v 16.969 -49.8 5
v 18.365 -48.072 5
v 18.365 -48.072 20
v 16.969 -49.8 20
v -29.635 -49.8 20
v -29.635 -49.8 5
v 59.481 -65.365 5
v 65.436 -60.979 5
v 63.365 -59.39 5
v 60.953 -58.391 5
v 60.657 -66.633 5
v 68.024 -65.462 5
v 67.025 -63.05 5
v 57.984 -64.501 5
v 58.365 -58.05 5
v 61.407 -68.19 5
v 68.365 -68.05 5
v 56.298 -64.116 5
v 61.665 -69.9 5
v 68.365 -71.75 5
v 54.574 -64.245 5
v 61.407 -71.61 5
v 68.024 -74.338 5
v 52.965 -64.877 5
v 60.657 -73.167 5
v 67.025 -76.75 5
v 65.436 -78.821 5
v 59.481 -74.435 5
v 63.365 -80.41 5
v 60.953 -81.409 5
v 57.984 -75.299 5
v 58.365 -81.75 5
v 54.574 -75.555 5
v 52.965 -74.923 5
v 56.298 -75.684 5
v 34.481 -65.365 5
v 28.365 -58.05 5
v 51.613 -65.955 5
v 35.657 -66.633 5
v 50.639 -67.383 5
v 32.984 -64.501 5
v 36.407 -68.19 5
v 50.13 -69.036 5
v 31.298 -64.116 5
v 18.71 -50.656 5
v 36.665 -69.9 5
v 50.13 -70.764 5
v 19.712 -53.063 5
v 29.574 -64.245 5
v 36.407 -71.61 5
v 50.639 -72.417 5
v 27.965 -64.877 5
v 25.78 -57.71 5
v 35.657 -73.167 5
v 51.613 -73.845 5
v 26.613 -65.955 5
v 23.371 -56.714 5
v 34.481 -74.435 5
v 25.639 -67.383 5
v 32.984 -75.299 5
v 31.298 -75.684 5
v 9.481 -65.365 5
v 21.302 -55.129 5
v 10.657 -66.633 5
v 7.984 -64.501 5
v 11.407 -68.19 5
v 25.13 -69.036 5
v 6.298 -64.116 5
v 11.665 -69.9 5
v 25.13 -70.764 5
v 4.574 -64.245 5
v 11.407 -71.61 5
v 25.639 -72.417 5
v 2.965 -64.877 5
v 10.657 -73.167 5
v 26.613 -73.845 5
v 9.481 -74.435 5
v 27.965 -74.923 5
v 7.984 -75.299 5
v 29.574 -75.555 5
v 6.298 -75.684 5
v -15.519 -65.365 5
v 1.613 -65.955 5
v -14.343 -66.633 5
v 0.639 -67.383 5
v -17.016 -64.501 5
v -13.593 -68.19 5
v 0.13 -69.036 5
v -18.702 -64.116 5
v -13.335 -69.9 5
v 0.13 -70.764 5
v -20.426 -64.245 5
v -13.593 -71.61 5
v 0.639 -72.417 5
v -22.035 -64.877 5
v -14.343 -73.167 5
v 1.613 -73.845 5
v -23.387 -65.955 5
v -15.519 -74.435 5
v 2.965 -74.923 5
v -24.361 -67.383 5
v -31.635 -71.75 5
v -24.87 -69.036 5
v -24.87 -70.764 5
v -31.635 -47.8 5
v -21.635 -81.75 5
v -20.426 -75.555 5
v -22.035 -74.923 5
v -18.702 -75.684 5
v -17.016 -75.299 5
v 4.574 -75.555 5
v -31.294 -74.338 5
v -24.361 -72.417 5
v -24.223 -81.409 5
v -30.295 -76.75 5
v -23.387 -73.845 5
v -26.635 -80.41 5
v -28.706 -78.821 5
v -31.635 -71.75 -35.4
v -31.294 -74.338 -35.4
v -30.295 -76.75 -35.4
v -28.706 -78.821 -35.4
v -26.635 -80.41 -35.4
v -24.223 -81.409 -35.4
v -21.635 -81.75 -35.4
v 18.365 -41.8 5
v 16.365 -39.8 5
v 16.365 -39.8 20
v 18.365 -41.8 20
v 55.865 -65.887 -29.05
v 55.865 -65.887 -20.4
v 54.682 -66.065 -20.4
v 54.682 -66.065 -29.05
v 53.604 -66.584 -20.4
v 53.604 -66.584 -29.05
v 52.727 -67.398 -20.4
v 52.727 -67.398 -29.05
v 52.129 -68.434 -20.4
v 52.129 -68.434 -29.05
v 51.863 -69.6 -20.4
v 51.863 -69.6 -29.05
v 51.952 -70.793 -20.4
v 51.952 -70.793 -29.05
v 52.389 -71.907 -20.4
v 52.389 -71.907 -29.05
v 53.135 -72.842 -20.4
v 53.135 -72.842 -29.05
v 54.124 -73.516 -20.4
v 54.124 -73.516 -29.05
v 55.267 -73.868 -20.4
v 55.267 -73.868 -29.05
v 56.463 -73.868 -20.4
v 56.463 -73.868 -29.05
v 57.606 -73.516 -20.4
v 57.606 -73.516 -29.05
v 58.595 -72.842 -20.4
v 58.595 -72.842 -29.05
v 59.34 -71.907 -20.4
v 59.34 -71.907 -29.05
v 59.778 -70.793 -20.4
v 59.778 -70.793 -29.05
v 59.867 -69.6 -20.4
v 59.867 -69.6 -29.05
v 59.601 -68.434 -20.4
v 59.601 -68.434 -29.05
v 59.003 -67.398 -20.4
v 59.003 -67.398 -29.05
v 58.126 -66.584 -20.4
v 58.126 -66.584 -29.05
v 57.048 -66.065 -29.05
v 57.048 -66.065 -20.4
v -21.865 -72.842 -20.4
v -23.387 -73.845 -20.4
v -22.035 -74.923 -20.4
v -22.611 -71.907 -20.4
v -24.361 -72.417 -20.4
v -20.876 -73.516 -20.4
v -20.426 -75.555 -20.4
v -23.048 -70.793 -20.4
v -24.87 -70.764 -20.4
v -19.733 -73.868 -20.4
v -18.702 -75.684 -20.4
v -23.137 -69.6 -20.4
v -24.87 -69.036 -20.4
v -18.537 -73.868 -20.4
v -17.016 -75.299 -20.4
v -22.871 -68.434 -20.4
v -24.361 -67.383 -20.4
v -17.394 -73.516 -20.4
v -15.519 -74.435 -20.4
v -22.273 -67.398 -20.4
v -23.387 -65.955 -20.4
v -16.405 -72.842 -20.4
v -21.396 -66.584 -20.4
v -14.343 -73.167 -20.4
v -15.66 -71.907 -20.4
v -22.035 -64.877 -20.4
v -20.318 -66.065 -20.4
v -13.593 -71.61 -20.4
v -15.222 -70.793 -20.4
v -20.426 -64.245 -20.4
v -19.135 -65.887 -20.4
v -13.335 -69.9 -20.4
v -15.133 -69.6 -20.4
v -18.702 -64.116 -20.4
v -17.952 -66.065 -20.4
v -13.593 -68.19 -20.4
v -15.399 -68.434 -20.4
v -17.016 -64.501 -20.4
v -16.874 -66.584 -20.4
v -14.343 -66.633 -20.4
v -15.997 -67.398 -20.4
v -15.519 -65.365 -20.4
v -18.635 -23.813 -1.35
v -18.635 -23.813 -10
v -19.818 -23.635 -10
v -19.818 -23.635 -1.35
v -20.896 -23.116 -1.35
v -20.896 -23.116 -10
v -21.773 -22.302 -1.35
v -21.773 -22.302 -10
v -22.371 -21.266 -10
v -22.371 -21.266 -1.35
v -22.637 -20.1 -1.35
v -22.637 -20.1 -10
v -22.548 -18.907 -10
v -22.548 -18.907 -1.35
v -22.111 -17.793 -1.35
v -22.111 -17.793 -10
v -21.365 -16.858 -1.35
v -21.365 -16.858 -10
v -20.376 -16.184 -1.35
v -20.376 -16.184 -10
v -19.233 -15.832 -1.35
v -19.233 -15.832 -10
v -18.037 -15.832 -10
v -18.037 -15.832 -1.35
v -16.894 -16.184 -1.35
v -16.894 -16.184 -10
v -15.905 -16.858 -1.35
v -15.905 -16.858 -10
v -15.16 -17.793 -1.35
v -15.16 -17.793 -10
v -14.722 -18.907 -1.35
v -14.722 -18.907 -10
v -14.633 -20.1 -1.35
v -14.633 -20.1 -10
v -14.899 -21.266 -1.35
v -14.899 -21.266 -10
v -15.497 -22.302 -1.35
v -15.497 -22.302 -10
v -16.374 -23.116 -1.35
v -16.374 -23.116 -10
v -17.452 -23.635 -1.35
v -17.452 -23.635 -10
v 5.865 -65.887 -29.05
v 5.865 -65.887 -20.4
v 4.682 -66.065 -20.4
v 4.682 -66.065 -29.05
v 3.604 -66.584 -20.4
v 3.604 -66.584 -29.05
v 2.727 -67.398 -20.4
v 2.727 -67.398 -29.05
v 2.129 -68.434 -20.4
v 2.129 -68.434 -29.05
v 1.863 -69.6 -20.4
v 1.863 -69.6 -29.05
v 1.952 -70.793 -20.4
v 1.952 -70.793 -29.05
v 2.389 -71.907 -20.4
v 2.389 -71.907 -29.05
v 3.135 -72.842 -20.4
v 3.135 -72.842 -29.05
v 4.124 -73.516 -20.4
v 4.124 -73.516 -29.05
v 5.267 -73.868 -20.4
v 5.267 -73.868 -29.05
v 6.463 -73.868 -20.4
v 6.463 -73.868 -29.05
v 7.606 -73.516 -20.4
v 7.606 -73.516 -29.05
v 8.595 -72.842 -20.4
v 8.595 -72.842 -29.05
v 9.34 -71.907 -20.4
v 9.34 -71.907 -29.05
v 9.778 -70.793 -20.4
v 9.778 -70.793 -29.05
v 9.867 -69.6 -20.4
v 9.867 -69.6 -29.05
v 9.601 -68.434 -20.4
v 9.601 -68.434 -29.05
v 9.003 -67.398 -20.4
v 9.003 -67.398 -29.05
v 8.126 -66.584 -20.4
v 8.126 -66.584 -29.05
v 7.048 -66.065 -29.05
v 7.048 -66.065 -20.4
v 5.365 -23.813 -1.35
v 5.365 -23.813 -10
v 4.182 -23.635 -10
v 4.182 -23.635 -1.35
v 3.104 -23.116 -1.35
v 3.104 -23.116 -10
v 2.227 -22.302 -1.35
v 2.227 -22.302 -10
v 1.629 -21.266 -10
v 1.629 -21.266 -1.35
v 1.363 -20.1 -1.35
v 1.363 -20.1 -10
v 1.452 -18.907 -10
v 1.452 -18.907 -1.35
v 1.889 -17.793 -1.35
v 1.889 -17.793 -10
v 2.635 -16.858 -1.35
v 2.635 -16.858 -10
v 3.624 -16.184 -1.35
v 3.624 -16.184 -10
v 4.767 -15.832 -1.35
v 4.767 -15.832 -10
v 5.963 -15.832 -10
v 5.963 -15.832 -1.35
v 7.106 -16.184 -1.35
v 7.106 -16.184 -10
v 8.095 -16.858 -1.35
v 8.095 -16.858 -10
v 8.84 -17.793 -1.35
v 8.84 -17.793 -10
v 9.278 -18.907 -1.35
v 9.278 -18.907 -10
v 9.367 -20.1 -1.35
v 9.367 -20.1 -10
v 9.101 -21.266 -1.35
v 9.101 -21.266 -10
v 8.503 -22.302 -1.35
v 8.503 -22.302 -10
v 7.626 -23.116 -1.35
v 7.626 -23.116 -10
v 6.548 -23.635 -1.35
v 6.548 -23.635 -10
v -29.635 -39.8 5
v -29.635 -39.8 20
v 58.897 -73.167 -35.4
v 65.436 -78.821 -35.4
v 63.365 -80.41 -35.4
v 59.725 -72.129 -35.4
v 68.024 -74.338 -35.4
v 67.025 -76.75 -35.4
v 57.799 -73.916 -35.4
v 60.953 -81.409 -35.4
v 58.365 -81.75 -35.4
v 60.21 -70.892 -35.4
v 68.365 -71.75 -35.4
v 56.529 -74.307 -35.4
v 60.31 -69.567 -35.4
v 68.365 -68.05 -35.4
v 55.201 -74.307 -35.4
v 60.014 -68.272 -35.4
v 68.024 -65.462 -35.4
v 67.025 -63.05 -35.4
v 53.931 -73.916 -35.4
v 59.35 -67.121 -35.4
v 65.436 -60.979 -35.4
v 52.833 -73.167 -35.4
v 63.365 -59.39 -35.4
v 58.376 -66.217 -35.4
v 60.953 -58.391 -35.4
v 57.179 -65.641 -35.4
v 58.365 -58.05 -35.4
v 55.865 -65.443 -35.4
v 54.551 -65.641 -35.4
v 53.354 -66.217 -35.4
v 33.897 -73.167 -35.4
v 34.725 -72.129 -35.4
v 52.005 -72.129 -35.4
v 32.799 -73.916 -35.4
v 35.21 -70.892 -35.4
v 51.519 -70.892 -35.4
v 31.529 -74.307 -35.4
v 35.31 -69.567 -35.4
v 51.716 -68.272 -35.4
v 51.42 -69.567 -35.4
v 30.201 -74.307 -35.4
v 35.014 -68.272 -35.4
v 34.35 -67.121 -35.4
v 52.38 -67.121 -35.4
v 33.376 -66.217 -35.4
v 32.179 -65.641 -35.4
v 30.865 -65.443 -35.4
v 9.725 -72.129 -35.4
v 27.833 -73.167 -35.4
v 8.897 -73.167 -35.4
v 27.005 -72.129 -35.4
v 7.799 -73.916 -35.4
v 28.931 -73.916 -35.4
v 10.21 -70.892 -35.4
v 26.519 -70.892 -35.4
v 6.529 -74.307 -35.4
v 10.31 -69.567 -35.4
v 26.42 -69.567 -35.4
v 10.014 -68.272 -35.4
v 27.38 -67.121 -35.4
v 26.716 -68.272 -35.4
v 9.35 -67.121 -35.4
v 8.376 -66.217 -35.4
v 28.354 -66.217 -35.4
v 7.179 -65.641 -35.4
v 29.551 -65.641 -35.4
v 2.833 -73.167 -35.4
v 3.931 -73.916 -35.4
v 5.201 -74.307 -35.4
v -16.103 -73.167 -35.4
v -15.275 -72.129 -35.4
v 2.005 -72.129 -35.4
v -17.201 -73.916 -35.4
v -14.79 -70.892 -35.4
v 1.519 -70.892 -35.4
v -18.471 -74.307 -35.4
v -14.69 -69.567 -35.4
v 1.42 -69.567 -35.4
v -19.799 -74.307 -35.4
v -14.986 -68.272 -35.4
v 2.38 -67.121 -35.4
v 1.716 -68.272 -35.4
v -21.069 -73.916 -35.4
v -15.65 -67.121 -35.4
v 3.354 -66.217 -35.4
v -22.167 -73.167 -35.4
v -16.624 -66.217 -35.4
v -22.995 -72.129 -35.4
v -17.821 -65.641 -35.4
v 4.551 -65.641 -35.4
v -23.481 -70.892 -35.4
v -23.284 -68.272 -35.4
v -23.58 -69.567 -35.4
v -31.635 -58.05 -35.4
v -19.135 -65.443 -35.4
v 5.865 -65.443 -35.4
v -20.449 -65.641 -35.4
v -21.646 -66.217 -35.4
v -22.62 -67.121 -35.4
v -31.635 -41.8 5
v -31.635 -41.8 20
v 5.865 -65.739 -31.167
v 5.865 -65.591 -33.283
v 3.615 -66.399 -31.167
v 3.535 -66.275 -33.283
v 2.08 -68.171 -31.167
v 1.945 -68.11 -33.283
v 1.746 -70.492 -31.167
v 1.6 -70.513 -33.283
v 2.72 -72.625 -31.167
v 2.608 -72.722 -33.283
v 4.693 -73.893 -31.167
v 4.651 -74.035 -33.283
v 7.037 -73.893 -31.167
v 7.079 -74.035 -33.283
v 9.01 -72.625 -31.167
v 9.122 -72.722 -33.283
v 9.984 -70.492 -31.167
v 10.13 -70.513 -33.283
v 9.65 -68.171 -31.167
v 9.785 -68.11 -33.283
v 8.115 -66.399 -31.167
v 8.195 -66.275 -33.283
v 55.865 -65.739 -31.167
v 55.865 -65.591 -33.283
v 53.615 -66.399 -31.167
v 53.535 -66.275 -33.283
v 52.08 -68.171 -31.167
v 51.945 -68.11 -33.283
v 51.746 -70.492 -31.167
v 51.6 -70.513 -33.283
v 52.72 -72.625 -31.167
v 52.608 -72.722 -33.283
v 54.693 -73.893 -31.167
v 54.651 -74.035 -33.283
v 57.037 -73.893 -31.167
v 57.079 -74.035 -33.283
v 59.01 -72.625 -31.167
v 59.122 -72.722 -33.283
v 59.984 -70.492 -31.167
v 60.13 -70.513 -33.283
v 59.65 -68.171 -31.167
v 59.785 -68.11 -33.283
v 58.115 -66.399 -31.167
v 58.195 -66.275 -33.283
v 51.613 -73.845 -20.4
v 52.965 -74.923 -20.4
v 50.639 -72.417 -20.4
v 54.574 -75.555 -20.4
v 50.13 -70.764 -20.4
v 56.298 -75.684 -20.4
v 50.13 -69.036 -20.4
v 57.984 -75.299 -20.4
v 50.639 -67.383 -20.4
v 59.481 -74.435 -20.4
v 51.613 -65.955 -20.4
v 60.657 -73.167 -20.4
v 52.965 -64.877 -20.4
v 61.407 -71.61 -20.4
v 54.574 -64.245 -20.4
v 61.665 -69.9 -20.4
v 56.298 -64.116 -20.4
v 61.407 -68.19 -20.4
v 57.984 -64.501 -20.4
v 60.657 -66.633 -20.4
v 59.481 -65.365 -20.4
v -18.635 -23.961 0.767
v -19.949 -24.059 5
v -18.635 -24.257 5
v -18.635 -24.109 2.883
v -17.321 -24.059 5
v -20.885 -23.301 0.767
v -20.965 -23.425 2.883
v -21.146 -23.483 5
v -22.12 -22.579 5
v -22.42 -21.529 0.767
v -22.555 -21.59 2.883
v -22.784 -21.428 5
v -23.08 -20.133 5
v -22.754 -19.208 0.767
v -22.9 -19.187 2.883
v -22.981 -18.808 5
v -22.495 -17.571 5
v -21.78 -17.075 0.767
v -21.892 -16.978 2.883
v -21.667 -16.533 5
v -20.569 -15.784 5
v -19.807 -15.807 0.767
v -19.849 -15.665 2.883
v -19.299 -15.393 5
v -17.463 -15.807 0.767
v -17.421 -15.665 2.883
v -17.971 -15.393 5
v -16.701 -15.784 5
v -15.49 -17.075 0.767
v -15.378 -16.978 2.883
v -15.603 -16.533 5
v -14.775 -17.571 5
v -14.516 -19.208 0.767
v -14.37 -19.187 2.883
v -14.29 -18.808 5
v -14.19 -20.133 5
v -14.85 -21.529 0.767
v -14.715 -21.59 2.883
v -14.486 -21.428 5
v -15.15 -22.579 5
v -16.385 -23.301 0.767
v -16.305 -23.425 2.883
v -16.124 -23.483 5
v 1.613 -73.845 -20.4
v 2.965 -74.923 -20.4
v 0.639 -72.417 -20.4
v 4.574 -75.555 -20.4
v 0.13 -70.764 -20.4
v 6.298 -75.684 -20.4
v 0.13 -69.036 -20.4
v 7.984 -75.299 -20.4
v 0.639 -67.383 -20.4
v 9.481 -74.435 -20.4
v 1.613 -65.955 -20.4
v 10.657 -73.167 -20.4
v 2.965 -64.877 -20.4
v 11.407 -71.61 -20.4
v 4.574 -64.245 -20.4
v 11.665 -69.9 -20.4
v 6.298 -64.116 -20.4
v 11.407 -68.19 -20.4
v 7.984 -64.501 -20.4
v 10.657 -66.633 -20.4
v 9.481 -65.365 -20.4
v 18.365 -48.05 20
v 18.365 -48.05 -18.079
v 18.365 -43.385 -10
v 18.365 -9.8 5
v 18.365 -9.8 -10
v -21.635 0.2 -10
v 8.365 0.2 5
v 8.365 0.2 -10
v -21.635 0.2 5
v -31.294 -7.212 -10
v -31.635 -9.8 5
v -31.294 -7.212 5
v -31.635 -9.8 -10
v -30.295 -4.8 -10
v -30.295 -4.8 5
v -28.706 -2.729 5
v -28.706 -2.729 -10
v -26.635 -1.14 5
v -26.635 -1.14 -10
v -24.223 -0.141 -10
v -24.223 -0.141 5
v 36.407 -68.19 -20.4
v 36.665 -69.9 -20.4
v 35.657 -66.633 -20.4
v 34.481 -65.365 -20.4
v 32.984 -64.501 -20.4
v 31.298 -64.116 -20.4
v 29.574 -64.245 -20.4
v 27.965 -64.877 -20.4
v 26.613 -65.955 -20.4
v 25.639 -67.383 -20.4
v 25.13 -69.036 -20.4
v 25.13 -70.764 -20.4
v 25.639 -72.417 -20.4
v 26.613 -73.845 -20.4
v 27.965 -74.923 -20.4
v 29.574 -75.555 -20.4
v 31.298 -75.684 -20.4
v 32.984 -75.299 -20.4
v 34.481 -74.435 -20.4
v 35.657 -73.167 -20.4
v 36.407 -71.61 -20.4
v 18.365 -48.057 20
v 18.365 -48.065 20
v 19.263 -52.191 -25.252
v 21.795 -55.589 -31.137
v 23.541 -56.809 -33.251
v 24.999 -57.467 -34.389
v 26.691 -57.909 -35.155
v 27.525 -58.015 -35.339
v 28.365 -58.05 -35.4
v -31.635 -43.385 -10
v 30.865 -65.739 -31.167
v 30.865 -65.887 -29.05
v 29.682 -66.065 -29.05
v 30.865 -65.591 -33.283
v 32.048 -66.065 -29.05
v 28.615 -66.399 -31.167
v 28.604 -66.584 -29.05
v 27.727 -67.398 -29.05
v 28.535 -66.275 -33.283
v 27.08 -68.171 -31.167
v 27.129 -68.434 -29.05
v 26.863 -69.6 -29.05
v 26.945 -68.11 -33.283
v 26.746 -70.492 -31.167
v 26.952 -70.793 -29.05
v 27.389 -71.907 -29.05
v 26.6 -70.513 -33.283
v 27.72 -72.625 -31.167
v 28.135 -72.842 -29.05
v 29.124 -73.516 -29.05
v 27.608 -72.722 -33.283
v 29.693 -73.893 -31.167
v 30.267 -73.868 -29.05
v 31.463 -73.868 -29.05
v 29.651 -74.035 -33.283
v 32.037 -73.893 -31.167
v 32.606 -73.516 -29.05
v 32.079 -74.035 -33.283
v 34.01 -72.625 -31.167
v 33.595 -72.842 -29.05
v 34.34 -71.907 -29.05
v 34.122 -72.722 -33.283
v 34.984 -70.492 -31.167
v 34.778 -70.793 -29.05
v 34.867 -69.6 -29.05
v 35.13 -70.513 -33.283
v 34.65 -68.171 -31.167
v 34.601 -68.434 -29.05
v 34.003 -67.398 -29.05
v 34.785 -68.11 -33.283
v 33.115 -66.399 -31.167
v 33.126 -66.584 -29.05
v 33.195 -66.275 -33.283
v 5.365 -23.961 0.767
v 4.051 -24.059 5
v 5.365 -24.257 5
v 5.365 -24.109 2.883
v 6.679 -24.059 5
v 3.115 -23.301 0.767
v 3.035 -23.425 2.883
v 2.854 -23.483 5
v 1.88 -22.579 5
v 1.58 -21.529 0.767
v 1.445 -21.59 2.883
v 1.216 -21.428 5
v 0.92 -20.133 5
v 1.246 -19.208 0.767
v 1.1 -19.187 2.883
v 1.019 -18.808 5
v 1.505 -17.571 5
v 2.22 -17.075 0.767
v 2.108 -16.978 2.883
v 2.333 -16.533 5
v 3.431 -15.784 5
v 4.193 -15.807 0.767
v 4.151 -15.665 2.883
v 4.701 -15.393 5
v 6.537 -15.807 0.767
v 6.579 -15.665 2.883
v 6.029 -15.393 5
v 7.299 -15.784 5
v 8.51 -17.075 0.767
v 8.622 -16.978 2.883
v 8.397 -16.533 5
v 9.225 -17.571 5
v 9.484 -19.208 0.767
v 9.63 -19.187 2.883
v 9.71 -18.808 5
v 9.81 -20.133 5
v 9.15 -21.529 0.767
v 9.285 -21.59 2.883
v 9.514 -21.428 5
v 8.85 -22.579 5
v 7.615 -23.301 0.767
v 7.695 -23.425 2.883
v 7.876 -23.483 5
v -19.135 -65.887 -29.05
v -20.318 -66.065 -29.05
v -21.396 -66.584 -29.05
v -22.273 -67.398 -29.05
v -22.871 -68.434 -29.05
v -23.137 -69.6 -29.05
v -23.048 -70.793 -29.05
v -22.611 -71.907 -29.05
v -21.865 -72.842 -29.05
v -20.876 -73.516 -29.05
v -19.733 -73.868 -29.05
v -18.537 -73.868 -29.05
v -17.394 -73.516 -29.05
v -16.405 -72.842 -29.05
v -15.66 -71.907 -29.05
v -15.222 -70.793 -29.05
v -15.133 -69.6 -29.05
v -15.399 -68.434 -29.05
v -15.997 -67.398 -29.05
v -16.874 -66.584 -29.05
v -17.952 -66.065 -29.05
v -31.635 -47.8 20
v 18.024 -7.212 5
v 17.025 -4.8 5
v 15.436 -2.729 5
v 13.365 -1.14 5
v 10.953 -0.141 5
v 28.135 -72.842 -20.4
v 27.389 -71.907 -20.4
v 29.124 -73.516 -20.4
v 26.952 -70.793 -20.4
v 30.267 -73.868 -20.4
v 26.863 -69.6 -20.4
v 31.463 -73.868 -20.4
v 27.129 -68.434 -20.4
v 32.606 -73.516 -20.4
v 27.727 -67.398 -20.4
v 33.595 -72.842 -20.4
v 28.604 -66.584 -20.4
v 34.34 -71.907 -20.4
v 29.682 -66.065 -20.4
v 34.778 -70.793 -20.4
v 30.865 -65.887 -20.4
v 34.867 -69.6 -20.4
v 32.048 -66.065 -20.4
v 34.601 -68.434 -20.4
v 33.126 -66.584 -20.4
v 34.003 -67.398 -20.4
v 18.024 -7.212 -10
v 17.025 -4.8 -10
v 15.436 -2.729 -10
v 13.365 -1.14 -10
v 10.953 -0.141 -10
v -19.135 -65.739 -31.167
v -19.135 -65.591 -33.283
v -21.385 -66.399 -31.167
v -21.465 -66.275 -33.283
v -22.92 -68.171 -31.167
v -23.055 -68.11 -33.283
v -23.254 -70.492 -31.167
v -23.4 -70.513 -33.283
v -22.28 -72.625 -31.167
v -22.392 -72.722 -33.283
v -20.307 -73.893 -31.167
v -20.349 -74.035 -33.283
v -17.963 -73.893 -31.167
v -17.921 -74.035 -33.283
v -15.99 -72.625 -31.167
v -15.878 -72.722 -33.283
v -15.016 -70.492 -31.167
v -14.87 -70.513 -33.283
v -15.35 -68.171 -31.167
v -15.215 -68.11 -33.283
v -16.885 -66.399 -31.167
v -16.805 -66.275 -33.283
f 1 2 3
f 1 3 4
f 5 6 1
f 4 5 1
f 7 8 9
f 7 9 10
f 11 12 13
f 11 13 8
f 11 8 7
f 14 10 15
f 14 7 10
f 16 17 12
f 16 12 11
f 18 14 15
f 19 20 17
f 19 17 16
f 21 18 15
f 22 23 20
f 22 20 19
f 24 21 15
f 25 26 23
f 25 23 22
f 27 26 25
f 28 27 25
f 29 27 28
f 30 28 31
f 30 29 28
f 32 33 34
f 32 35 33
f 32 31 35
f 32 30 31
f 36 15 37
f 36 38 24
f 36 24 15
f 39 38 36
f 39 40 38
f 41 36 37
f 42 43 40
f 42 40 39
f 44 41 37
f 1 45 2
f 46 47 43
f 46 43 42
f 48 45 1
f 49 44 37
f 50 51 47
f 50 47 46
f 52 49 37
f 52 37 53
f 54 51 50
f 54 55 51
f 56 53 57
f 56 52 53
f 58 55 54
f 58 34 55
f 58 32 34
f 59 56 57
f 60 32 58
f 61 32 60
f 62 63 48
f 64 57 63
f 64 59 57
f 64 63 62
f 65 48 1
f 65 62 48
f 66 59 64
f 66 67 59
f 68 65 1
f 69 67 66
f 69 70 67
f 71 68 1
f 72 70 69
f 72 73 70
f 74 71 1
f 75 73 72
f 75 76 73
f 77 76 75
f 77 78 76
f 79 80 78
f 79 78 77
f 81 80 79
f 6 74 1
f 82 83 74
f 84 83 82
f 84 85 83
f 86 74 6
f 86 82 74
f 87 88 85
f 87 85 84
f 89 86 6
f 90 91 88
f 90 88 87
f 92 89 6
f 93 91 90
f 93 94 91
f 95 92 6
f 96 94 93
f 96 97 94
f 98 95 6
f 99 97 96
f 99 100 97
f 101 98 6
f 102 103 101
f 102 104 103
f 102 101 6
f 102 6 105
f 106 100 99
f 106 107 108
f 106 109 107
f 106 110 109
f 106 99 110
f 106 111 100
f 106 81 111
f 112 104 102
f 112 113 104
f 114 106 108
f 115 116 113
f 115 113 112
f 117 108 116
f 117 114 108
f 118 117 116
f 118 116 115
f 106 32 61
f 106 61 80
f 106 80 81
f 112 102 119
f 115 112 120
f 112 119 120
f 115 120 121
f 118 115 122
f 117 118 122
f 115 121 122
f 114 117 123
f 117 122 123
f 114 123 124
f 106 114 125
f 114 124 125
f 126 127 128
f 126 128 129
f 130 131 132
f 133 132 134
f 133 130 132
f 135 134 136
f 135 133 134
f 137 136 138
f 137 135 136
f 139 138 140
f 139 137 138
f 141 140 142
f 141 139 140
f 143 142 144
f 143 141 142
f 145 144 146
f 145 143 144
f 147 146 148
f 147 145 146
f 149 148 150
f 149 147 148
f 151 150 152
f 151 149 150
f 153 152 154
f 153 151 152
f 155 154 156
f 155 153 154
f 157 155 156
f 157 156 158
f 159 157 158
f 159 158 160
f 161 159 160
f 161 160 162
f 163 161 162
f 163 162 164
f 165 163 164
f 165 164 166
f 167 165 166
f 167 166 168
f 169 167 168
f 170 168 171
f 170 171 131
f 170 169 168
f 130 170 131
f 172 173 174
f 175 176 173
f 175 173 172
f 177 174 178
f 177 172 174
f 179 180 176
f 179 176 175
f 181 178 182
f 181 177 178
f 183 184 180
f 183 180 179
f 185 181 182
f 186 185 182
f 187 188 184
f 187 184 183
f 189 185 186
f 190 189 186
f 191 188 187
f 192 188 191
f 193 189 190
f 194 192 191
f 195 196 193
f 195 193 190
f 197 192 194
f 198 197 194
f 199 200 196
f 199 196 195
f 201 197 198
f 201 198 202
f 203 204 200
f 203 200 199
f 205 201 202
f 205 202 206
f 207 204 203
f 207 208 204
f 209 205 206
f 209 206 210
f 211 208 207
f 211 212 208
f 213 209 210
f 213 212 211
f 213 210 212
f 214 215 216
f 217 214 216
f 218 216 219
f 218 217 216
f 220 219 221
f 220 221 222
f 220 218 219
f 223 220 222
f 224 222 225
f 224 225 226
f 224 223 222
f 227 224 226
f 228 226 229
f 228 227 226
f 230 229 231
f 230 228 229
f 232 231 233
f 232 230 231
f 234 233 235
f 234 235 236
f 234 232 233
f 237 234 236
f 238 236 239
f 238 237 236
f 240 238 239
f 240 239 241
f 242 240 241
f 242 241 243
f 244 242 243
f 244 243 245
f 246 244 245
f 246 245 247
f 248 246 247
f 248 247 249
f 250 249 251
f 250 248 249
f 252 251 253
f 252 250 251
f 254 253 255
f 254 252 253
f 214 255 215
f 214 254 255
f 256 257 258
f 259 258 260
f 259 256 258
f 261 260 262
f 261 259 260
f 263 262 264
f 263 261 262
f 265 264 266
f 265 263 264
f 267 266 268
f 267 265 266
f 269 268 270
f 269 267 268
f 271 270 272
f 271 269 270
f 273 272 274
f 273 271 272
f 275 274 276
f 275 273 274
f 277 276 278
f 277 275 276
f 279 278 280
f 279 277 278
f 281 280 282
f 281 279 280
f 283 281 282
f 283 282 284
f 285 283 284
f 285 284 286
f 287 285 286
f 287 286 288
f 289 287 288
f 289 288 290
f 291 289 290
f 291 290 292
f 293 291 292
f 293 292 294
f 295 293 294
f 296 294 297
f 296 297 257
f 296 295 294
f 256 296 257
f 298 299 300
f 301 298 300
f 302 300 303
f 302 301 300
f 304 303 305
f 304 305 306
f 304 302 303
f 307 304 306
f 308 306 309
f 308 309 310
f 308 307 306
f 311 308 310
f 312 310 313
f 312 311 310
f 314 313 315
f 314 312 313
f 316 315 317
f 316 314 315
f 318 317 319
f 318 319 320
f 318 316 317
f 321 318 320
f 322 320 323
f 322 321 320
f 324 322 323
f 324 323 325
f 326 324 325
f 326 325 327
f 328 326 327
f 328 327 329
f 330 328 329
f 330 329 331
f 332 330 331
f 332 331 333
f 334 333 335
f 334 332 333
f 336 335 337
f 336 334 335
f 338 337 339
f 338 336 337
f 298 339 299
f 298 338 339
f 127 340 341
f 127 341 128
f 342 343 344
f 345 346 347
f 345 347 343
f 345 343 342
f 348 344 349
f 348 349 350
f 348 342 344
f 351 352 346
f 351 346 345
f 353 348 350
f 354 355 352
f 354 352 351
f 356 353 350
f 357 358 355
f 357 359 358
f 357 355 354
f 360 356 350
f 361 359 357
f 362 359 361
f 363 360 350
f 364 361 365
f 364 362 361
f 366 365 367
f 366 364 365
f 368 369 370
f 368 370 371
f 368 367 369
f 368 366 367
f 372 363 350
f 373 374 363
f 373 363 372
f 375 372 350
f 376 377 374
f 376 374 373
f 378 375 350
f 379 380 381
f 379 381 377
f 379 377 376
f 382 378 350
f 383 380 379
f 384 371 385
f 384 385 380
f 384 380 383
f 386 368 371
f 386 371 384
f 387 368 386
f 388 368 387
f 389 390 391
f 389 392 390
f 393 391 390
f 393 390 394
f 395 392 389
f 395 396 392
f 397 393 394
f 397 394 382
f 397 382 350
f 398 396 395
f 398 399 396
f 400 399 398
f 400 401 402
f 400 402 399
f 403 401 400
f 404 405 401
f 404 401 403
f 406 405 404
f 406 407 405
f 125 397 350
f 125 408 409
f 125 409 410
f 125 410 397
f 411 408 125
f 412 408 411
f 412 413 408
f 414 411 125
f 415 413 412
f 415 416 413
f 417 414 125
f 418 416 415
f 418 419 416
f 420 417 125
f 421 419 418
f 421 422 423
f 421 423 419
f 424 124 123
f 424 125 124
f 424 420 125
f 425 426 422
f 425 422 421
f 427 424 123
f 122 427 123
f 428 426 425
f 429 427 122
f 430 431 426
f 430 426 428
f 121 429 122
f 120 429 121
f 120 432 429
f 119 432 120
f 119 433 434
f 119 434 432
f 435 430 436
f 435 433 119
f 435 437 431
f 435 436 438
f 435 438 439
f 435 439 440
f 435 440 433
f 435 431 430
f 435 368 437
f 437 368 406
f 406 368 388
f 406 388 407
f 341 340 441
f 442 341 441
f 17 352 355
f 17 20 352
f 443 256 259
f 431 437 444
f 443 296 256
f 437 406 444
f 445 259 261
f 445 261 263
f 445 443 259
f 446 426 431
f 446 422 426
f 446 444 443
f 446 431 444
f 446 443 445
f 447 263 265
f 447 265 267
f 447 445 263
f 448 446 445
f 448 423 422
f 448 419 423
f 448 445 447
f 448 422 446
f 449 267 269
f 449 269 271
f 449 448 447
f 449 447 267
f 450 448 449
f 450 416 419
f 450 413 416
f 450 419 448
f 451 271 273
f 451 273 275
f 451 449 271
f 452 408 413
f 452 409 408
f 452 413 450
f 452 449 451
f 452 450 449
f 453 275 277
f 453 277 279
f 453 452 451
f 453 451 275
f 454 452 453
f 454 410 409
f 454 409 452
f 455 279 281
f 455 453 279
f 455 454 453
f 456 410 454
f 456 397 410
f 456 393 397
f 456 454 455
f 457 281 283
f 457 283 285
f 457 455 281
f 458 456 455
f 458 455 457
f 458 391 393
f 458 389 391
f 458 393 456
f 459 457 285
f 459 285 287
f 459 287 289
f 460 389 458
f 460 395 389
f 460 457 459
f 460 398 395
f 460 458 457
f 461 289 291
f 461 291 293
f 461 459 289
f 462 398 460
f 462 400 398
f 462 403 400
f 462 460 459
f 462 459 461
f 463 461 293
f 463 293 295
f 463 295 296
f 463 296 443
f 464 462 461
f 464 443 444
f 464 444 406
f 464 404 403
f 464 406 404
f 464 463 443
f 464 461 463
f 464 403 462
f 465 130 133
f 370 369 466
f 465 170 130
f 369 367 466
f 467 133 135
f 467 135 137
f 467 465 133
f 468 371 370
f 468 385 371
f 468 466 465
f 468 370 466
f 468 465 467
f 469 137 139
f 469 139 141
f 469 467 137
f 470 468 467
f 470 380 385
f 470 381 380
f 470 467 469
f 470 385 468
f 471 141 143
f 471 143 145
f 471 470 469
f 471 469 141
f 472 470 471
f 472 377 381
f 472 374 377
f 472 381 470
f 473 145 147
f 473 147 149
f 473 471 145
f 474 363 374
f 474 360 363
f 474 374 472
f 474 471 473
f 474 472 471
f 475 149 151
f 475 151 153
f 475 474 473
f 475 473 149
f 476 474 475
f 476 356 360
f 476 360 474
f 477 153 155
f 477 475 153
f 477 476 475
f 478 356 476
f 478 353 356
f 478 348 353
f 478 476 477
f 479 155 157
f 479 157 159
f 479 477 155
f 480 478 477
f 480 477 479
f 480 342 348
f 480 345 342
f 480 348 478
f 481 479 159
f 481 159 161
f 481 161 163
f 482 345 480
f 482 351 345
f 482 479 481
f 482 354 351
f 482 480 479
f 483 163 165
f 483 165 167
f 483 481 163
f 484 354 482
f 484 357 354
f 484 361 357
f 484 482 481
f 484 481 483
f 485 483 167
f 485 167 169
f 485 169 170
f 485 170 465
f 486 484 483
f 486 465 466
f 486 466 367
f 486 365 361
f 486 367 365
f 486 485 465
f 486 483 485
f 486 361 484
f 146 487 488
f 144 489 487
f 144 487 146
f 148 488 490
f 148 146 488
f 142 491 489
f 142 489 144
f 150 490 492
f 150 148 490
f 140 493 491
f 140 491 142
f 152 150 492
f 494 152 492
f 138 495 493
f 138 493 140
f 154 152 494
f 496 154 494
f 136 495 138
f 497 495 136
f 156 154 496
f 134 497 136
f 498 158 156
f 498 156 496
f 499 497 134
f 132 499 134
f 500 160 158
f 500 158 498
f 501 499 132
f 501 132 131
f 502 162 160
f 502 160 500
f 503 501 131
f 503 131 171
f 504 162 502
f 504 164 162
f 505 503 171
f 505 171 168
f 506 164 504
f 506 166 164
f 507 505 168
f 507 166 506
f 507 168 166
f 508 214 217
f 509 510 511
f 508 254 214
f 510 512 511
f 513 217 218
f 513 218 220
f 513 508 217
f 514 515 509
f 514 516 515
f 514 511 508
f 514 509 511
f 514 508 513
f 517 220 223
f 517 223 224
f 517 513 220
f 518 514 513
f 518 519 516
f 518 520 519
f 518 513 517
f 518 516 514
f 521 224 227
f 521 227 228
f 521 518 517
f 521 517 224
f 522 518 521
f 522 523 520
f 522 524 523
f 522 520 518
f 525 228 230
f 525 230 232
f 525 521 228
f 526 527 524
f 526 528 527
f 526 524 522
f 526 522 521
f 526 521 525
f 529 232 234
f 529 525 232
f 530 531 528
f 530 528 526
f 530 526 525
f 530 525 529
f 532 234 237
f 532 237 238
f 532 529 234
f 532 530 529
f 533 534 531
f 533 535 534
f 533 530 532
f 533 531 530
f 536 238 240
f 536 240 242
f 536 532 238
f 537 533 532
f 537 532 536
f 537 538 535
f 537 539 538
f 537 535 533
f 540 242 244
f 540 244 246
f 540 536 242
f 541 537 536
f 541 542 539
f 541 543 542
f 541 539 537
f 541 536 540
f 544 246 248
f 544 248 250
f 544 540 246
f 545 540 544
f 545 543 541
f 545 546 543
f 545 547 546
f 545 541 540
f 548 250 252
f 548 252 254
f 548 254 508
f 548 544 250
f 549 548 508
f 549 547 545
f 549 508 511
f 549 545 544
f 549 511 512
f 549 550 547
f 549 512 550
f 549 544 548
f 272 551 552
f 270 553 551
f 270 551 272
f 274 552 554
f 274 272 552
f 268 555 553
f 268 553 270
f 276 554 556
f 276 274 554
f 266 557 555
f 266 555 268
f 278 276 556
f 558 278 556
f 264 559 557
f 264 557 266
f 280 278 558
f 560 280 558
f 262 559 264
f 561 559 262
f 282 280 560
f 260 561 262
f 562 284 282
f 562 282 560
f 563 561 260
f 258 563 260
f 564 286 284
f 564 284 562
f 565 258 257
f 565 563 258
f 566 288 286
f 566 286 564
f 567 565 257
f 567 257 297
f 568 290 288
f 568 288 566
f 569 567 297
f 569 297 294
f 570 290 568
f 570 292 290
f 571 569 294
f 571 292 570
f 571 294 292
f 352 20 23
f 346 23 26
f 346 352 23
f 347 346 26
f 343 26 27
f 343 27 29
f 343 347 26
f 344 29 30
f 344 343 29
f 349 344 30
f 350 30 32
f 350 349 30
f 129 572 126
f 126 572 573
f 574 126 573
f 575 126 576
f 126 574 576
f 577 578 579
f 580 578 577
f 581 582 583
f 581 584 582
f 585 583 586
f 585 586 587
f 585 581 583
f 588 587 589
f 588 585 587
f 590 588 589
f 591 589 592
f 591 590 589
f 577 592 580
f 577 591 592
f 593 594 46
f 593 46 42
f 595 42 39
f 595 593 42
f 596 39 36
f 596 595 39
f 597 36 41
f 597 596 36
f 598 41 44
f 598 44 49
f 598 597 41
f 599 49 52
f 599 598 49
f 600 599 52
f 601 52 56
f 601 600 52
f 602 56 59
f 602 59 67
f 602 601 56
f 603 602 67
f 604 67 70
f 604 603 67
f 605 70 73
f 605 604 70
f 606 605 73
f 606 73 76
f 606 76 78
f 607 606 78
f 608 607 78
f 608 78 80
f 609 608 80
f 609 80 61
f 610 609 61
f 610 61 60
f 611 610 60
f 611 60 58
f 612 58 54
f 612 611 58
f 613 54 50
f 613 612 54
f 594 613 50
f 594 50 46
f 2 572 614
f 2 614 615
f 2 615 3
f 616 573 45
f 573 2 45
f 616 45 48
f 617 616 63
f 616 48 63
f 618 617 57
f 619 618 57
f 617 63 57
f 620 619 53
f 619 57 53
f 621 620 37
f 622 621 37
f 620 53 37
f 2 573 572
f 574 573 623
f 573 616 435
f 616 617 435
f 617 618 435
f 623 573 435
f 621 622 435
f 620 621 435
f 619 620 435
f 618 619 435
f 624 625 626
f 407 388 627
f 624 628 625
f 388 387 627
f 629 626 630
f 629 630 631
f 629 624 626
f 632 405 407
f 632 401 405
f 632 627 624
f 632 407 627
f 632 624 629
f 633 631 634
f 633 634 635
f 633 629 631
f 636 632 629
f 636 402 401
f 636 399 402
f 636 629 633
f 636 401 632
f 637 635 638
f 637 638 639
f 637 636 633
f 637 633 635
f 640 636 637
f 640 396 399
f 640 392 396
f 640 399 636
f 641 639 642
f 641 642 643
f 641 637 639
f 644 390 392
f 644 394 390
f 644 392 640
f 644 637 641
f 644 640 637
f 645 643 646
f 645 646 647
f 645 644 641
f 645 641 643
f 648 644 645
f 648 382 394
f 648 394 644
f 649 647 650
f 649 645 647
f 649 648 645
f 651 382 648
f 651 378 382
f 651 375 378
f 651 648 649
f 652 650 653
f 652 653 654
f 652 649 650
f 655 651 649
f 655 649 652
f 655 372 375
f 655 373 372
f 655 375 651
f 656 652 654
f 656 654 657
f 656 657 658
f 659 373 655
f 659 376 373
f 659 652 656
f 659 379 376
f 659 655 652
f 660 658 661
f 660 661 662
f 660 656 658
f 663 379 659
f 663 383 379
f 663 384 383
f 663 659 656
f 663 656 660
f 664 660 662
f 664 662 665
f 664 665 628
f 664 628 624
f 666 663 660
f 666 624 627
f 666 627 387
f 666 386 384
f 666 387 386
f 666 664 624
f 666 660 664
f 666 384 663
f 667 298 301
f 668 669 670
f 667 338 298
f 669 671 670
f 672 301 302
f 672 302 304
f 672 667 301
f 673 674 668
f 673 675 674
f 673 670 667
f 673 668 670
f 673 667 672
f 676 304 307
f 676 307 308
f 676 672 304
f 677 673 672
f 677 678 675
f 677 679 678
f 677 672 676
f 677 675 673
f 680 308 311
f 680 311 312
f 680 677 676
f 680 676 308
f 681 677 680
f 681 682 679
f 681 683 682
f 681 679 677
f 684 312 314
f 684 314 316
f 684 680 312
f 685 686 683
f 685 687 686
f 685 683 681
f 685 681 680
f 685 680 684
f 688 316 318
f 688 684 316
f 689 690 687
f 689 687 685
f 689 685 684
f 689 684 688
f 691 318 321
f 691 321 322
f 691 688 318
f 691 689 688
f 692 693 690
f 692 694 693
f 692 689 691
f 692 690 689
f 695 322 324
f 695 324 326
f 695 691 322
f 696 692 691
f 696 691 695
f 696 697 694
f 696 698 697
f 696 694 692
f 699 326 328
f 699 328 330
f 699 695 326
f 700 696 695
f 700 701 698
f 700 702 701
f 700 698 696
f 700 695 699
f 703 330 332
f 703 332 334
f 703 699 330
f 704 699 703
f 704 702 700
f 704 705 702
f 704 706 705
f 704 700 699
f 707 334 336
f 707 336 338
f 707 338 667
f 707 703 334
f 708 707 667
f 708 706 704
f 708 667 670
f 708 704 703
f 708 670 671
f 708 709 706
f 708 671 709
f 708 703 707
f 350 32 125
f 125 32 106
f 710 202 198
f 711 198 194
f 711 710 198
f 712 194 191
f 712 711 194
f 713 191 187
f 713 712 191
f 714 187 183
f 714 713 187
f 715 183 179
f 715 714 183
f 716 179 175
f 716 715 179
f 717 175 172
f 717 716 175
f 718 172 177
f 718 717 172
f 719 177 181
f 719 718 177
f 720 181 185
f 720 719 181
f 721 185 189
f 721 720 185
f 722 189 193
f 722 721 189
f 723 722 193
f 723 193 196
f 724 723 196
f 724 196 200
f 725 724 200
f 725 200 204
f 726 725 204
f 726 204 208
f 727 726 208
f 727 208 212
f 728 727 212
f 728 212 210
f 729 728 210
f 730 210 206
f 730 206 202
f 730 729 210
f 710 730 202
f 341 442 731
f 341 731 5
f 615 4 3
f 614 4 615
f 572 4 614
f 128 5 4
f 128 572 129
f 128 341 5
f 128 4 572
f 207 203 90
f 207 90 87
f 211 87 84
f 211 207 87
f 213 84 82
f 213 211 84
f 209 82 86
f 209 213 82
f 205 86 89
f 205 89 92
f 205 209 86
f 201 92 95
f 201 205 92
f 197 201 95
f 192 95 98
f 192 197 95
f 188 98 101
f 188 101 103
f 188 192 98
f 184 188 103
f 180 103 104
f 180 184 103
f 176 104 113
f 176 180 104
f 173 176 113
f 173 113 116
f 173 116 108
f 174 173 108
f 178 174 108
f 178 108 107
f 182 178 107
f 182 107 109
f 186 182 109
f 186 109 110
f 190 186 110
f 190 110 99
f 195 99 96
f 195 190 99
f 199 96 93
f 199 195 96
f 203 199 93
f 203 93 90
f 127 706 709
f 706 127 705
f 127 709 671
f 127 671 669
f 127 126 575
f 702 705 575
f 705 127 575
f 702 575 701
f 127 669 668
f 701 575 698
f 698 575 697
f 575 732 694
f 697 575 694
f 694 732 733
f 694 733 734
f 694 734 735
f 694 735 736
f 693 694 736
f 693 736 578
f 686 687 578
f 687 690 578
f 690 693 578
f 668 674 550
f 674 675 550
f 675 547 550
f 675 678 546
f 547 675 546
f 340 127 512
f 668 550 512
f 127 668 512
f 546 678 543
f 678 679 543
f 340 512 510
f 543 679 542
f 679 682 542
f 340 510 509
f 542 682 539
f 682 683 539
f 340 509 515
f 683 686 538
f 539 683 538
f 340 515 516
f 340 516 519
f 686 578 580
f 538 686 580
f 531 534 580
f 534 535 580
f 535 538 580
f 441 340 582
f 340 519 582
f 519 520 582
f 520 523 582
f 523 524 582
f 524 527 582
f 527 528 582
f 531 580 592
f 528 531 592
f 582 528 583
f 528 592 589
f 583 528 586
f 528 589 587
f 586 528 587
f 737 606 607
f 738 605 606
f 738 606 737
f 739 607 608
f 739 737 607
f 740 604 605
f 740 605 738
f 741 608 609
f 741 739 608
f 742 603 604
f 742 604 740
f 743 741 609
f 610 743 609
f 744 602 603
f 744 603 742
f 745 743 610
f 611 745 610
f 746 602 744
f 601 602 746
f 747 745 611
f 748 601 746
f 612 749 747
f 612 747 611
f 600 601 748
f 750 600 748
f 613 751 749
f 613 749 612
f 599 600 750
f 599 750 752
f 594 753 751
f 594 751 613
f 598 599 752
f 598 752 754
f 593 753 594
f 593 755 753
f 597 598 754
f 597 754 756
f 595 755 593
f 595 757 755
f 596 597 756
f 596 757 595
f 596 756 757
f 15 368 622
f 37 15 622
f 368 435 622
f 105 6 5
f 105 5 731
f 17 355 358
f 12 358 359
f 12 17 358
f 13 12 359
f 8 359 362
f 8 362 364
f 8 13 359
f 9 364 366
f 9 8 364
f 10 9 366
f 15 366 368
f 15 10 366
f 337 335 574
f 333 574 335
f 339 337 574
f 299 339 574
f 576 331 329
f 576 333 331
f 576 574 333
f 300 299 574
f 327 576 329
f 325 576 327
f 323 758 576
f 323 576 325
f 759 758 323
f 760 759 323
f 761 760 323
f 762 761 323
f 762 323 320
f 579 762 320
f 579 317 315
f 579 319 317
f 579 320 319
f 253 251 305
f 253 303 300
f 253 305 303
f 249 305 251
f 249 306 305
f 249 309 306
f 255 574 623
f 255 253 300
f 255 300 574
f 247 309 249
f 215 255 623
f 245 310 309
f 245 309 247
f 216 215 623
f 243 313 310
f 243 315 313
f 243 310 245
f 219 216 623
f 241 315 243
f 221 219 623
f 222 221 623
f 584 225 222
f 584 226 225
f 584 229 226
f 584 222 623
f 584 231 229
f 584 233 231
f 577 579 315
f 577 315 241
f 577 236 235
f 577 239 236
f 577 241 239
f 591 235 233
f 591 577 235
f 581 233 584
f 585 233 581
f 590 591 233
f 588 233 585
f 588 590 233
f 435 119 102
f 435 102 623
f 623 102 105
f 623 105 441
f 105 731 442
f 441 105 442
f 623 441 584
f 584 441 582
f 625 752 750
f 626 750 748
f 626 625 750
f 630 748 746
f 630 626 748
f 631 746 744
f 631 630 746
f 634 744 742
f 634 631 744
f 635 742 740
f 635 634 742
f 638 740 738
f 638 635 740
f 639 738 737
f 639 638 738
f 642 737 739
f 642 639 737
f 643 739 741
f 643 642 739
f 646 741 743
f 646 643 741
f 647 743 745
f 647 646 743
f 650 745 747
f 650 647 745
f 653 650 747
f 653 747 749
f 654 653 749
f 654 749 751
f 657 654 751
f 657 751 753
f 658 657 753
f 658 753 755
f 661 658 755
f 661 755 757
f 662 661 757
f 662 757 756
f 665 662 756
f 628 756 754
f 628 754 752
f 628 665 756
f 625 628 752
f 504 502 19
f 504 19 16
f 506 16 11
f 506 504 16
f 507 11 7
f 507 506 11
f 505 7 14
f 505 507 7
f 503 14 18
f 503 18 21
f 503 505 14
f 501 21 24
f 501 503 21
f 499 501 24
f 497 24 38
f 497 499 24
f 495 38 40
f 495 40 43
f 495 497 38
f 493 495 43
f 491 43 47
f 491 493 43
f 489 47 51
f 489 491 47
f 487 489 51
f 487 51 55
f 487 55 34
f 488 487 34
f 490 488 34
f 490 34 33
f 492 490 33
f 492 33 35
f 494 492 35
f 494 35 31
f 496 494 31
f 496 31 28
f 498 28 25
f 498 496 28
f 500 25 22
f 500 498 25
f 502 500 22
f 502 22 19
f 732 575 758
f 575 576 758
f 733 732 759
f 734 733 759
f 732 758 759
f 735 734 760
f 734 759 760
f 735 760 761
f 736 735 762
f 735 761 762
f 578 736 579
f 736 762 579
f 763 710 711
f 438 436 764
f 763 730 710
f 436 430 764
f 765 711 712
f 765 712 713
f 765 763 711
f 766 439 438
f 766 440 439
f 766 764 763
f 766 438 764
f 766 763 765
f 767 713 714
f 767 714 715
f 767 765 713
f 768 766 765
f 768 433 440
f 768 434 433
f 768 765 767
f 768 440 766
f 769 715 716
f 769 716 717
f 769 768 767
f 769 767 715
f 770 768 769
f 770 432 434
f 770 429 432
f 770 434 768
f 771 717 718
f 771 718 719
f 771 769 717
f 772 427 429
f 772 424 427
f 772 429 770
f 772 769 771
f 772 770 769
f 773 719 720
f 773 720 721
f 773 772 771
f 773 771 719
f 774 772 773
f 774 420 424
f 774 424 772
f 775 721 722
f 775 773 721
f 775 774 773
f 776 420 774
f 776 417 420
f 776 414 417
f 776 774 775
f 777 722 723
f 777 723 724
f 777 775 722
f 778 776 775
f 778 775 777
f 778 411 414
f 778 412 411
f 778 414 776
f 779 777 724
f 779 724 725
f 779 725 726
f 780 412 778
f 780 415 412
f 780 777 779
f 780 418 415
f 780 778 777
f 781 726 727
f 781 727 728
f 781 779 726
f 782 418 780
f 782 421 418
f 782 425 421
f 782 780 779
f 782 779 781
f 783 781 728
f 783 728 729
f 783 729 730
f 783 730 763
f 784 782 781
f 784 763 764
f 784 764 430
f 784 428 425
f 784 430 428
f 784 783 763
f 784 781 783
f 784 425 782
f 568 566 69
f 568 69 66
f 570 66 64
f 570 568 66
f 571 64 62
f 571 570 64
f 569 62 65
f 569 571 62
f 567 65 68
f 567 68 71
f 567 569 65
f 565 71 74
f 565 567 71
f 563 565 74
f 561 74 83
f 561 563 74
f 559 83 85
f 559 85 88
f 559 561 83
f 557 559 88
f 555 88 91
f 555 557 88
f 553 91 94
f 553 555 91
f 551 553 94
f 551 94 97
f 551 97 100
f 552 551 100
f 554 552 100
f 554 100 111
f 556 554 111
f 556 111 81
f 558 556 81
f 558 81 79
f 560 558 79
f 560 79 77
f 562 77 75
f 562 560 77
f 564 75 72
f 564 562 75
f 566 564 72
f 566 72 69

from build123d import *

# Parameters (mm, degrees)
SKETCH4_W                         = 50
SKETCH4_H                         = 40
BOSS_EXTRUDE2_DEPTH               = 15
O_0_316_DIAMETER_HOLE1_AT_2_COUNT = 2
O_0_316_DIAMETER_HOLE1_AT_2_PITCH = 24
SKETCH10_W                        = 50
SKETCH10_H                        = 41.95
BOSS_EXTRUDE3_DEPTH               = 15
SKETCH12_W                        = 50
SKETCH12_H                        = 10
BOSS_EXTRUDE5_DEPTH               = 15
BOSS_EXTRUDE4_REACH               = 94.649
SKETCH11_W                        = 100
SKETCH11_H                        = 23.7
BOSS_EXTRUDE4_DIRECTION_2_DEPTH   = 25.4
O_0_316_DIAMETER_HOLE2_AT_2_COUNT = 2
O_0_316_DIAMETER_HOLE2_AT_2_PITCH = 25
O_0_316_DIAMETER_HOLE2_AT_3_COUNT = 2
O_0_316_DIAMETER_HOLE2_AT_3_PITCH = 50
O_0_316_DIAMETER_HOLE2_AT_4_COUNT = 2
O_0_316_DIAMETER_HOLE2_AT_4_PITCH = 75
CUT_EXTRUDE1_START                = -25.4
SKETCH13_R                        = 5.8
SKETCH13_R_2                      = 4.0132
CUT_EXTRUDE1_DEPTH                = 25.4
CHAMFER3_SIZE2                    = 25.4
CHAMFER3_SIZE                     = 14.664696837
FILLET1_R                         = 10


# Some blends are built 0.0001 mm under size
with BuildPart() as part:
    # Sketch4 → Boss-Extrude2 (new body)
    with BuildSketch(Plane(origin=(0, 0, 5), x_dir=(-1, 0, 0), z_dir=(0, 0, -1))):
        with Locations((6.635038983, -19.8)):
            Rectangle(SKETCH4_W, SKETCH4_H)
    extrude(amount=BOSS_EXTRUDE2_DEPTH)

    # Sketch9 → O (0.316) Diameter Hole1 (revolve, cut)
    with BuildSketch(Plane(origin=(-18.635038983, -19.8, 5), x_dir=(0, -1, 0), z_dir=(1, 0, 0))):
        Polygon((0, 0), (0, 15), (4.0132, 15), (4.0132, 6.350000732), (4.457235307, 0), align=None)
    o_0_316_diameter_hole1 = revolve(axis=Axis((-18.635038983, -19.8, 11.35), (0, 0, -1)), mode=Mode.SUBTRACT)

    # O (0.316) Diameter Hole1 at 2: O (0.316) Diameter Hole1 ×2
    with Locations(*[(i * O_0_316_DIAMETER_HOLE1_AT_2_PITCH, 0, 0) for i in range(1, O_0_316_DIAMETER_HOLE1_AT_2_COUNT)]):
        add(o_0_316_diameter_hole1, mode=Mode.SUBTRACT)

    # Sketch10 → Boss-Extrude3 (add)
    with BuildSketch(Plane(origin=(0, 0, -10), x_dir=(-1, 0, 0), z_dir=(0, 0, -1))):
        with Locations((6.635038983, -60.775)):
            Rectangle(SKETCH10_W, SKETCH10_H)
    extrude(amount=-BOSS_EXTRUDE3_DEPTH)

    # Sketch12 → Boss-Extrude5 (add)
    with BuildSketch(Plane.XY.offset(5)):
        with Locations((-6.635038983, -44.8)):
            Rectangle(SKETCH12_W, SKETCH12_H)
    extrude(amount=BOSS_EXTRUDE5_DEPTH)

    # Boss-Extrude4: up to this face of the body (flat: up to its plane)
    boss_extrude4_end = Plane(part.part.faces().sort_by_distance((-6.635038983, -19.8, 5))[0])
    # Sketch11 → Boss-Extrude4 (add, up to the picked face)
    with BuildSketch(Plane(origin=(0, 0, -10), x_dir=(-1, 0, 0), z_dir=(0, 0, -1)), mode=Mode.PRIVATE) as boss_extrude4_sk1:
        with Locations((-18.364961017, -69.9)):
            Rectangle(SKETCH11_W, SKETCH11_H)
    boss_extrude4_tool1 = split(extrude(boss_extrude4_sk1.sketch, amount=-BOSS_EXTRUDE4_REACH, mode=Mode.PRIVATE), bisect_by=boss_extrude4_end, keep=Keep.BOTH, mode=Mode.PRIVATE)
    add(boss_extrude4_tool1.solids().sort_by(Axis((18.364961, -69.9, -10), (0, 0, 1)))[0])

    # Sketch11 → Boss-Extrude4 direction 2 (add)
    with BuildSketch(Plane(origin=(0, 0, -10), x_dir=(-1, 0, 0), z_dir=(0, 0, -1))):
        with Locations((-18.364961017, -69.9)):
            Rectangle(SKETCH11_W, SKETCH11_H)
    extrude(amount=BOSS_EXTRUDE4_DIRECTION_2_DEPTH)

    # Sketch19 → O (0.316) Diameter Hole2 (revolve, cut)
    with BuildSketch(Plane(origin=(55.864961017, -69.9, -35.4), x_dir=(0, 1, 0), z_dir=(1, 0, 0))):
        Polygon((0, 0), (0, 55.4), (4.0132, 55.4), (4.0132, 6.349926268), (4.4572301, 0), align=None)
    o_0_316_diameter_hole2 = revolve(axis=Axis((55.864961017, -69.9, -41.75), (0, 0, 1)), mode=Mode.SUBTRACT)

    # O (0.316) Diameter Hole2 at 2: O (0.316) Diameter Hole2 ×2
    with Locations(*[(-i * O_0_316_DIAMETER_HOLE2_AT_2_PITCH, 0, 0) for i in range(1, O_0_316_DIAMETER_HOLE2_AT_2_COUNT)]):
        add(o_0_316_diameter_hole2, mode=Mode.SUBTRACT)

    # O (0.316) Diameter Hole2 at 3: O (0.316) Diameter Hole2 ×2
    with Locations(*[(-i * O_0_316_DIAMETER_HOLE2_AT_3_PITCH, 0, 0) for i in range(1, O_0_316_DIAMETER_HOLE2_AT_3_COUNT)]):
        add(o_0_316_diameter_hole2, mode=Mode.SUBTRACT)

    # O (0.316) Diameter Hole2 at 4: O (0.316) Diameter Hole2 ×2
    with Locations(*[(-i * O_0_316_DIAMETER_HOLE2_AT_4_PITCH, 0, 0) for i in range(1, O_0_316_DIAMETER_HOLE2_AT_4_COUNT)]):
        add(o_0_316_diameter_hole2, mode=Mode.SUBTRACT)

    # Sketch13 → Cut-Extrude1 (cut)
    # profile 1 of 4: a face of its own
    with BuildSketch(Plane.XY.offset(5).offset(CUT_EXTRUDE1_START)):
        with Locations((-19.135038983, -69.9)):
            Circle(SKETCH13_R)
        with Locations(Location((-19.135038983, -69.9, 0), (0, 0, 180))):
            Circle(SKETCH13_R_2, mode=Mode.SUBTRACT)
    # profile 2 of 4: a face of its own
    with BuildSketch(Plane.XY.offset(5).offset(CUT_EXTRUDE1_START)):
        with Locations((5.864961017, -69.9)):
            Circle(SKETCH13_R)
        with Locations(Location((5.864961017, -69.9, 0), (0, 0, 180))):
            Circle(SKETCH13_R_2, mode=Mode.SUBTRACT)
    # profile 3 of 4: a face of its own
    with BuildSketch(Plane.XY.offset(5).offset(CUT_EXTRUDE1_START)):
        with Locations((30.864961017, -69.9)):
            Circle(SKETCH13_R)
        with Locations(Location((30.864961017, -69.9, 0), (0, 0, 180))):
            Circle(SKETCH13_R_2, mode=Mode.SUBTRACT)
    # profile 4 of 4: a face of its own
    with BuildSketch(Plane.XY.offset(5).offset(CUT_EXTRUDE1_START)):
        with Locations((55.864961017, -69.9)):
            Circle(SKETCH13_R)
        with Locations(Location((55.864961017, -69.9, 0), (0, 0, 180))):
            Circle(SKETCH13_R_2, mode=Mode.SUBTRACT)
    extrude(amount=CUT_EXTRUDE1_DEPTH, mode=Mode.SUBTRACT)

    # Chamfer3
    chamfer3_edges = [part.edges().sort_by_distance(p)[0] for p in [
        (-6.635038983, -58.05, -10),
    ]]
    chamfer3_side = [part.faces().sort_by_distance(p)[0] for p in [
        (-6.635038983, -57.756706063, -10),
    ]]
    chamfer(chamfer3_edges, length=CHAMFER3_SIZE - 0.0001, length2=CHAMFER3_SIZE2 - 0.0001, reference=chamfer3_side[0])  # a hair under: the kernel refuses the full size

    # Fillet1
    fillet1_edges = [part.edges().sort_by_distance(p)[0] for p in [
        (-31.635038983, -81.75, -15.2),
        (68.364961017, -58.05, -15.2),
        (68.364961017, -81.75, -15.2),
        (18.364961017, 0.2, -2.5),
        (-31.635038983, 0.2, -2.5),
        (18.364961017, -58.05, -15.19995),
    ]]
    fillet(fillet1_edges, radius=FILLET1_R)

    # Chamfer2
    # the kernel refuses this chamfer: 2, 1.724779618 mm, written as the material it takes off along each edge
    with BuildSketch(Plane(origin=(18.519276683, -49.8, 5), x_dir=(-0.058004303634580846, 0.9983163330126716, 0), z_dir=(0, 0, 1))) as chamfer2_piece_1:
        with BuildLine():
            Line((1.793111056, 0), (0.030741404, 1.601811697))
            Line((0.030741404, 1.601811697), (-0.009191249, 1.60413187))
            ThreePointArc((-0.009191249, 1.60413187), (0.006496831, 0.80142144), (-0.039932653, 0.002320172))
            Line((-0.039932653, 0.002320172), (0.004703846, -0.03972246))
            ThreePointArc((0.004703846, -0.03972246), (0.895839611, 0.025445038), (1.790879262, -0.03993769))
            Line((1.790879262, -0.03993769), (1.793111056, 0))
        make_face()
    extrude(amount=19.48277764, mode=Mode.SUBTRACT)
    with BuildSketch(Plane(origin=(-31.635038983, -39.8, 5), x_dir=(0.9996219169112968, 0.0274958766105856, 0), z_dir=(0, 0, 1))) as chamfer2_piece_2:
        with BuildLine():
            Line((2.05734639, 0), (-0.11309431, -2.054235587))
            Line((-0.11309431, -2.054235587), (-0.153079186, -2.053135752))
            ThreePointArc((-0.153079186, -2.053135752), (-0.068258454, -1.026795659), (-0.039984877, 0.001099835))
            Line((-0.039984877, 0.001099835), (0.001099835, 0.039984877))
            ThreePointArc((0.001099835, 0.039984877), (1.028995329, 0.011711299), (2.058446225, 0.039984877))
            Line((2.058446225, 0.039984877), (2.05734639, 0))
        make_face()
    extrude(amount=20.143365976, mode=Mode.SUBTRACT)
    with BuildSketch(Plane(origin=(-31.635038983, -49.8, 5), x_dir=(0.9996219169112968, -0.027495876610585647, 0), z_dir=(0, 0, 1)), Plane(origin=(18.364961017, -39.8, 5), x_dir=(-0.9996219169112968, 0.027495876610585647, 0), z_dir=(0, 0, 1))) as chamfer2_piece_3:
        with BuildLine():
            Line((2.05734639, 0), (-0.11309431, 2.054235587))
            Line((-0.11309431, 2.054235587), (-0.153079186, 2.053135752))
            ThreePointArc((-0.153079186, 2.053135752), (-0.068258454, 1.026795659), (-0.039984877, -0.001099835))
            Line((-0.039984877, -0.001099835), (0.001099835, -0.039984877))
            ThreePointArc((0.001099835, -0.039984877), (1.028995329, -0.011711299), (2.058446225, -0.039984877))
            Line((2.058446225, -0.039984877), (2.05734639, 0))
        make_face()
    extrude(amount=20.143365976, mode=Mode.SUBTRACT)


solid = part.part
